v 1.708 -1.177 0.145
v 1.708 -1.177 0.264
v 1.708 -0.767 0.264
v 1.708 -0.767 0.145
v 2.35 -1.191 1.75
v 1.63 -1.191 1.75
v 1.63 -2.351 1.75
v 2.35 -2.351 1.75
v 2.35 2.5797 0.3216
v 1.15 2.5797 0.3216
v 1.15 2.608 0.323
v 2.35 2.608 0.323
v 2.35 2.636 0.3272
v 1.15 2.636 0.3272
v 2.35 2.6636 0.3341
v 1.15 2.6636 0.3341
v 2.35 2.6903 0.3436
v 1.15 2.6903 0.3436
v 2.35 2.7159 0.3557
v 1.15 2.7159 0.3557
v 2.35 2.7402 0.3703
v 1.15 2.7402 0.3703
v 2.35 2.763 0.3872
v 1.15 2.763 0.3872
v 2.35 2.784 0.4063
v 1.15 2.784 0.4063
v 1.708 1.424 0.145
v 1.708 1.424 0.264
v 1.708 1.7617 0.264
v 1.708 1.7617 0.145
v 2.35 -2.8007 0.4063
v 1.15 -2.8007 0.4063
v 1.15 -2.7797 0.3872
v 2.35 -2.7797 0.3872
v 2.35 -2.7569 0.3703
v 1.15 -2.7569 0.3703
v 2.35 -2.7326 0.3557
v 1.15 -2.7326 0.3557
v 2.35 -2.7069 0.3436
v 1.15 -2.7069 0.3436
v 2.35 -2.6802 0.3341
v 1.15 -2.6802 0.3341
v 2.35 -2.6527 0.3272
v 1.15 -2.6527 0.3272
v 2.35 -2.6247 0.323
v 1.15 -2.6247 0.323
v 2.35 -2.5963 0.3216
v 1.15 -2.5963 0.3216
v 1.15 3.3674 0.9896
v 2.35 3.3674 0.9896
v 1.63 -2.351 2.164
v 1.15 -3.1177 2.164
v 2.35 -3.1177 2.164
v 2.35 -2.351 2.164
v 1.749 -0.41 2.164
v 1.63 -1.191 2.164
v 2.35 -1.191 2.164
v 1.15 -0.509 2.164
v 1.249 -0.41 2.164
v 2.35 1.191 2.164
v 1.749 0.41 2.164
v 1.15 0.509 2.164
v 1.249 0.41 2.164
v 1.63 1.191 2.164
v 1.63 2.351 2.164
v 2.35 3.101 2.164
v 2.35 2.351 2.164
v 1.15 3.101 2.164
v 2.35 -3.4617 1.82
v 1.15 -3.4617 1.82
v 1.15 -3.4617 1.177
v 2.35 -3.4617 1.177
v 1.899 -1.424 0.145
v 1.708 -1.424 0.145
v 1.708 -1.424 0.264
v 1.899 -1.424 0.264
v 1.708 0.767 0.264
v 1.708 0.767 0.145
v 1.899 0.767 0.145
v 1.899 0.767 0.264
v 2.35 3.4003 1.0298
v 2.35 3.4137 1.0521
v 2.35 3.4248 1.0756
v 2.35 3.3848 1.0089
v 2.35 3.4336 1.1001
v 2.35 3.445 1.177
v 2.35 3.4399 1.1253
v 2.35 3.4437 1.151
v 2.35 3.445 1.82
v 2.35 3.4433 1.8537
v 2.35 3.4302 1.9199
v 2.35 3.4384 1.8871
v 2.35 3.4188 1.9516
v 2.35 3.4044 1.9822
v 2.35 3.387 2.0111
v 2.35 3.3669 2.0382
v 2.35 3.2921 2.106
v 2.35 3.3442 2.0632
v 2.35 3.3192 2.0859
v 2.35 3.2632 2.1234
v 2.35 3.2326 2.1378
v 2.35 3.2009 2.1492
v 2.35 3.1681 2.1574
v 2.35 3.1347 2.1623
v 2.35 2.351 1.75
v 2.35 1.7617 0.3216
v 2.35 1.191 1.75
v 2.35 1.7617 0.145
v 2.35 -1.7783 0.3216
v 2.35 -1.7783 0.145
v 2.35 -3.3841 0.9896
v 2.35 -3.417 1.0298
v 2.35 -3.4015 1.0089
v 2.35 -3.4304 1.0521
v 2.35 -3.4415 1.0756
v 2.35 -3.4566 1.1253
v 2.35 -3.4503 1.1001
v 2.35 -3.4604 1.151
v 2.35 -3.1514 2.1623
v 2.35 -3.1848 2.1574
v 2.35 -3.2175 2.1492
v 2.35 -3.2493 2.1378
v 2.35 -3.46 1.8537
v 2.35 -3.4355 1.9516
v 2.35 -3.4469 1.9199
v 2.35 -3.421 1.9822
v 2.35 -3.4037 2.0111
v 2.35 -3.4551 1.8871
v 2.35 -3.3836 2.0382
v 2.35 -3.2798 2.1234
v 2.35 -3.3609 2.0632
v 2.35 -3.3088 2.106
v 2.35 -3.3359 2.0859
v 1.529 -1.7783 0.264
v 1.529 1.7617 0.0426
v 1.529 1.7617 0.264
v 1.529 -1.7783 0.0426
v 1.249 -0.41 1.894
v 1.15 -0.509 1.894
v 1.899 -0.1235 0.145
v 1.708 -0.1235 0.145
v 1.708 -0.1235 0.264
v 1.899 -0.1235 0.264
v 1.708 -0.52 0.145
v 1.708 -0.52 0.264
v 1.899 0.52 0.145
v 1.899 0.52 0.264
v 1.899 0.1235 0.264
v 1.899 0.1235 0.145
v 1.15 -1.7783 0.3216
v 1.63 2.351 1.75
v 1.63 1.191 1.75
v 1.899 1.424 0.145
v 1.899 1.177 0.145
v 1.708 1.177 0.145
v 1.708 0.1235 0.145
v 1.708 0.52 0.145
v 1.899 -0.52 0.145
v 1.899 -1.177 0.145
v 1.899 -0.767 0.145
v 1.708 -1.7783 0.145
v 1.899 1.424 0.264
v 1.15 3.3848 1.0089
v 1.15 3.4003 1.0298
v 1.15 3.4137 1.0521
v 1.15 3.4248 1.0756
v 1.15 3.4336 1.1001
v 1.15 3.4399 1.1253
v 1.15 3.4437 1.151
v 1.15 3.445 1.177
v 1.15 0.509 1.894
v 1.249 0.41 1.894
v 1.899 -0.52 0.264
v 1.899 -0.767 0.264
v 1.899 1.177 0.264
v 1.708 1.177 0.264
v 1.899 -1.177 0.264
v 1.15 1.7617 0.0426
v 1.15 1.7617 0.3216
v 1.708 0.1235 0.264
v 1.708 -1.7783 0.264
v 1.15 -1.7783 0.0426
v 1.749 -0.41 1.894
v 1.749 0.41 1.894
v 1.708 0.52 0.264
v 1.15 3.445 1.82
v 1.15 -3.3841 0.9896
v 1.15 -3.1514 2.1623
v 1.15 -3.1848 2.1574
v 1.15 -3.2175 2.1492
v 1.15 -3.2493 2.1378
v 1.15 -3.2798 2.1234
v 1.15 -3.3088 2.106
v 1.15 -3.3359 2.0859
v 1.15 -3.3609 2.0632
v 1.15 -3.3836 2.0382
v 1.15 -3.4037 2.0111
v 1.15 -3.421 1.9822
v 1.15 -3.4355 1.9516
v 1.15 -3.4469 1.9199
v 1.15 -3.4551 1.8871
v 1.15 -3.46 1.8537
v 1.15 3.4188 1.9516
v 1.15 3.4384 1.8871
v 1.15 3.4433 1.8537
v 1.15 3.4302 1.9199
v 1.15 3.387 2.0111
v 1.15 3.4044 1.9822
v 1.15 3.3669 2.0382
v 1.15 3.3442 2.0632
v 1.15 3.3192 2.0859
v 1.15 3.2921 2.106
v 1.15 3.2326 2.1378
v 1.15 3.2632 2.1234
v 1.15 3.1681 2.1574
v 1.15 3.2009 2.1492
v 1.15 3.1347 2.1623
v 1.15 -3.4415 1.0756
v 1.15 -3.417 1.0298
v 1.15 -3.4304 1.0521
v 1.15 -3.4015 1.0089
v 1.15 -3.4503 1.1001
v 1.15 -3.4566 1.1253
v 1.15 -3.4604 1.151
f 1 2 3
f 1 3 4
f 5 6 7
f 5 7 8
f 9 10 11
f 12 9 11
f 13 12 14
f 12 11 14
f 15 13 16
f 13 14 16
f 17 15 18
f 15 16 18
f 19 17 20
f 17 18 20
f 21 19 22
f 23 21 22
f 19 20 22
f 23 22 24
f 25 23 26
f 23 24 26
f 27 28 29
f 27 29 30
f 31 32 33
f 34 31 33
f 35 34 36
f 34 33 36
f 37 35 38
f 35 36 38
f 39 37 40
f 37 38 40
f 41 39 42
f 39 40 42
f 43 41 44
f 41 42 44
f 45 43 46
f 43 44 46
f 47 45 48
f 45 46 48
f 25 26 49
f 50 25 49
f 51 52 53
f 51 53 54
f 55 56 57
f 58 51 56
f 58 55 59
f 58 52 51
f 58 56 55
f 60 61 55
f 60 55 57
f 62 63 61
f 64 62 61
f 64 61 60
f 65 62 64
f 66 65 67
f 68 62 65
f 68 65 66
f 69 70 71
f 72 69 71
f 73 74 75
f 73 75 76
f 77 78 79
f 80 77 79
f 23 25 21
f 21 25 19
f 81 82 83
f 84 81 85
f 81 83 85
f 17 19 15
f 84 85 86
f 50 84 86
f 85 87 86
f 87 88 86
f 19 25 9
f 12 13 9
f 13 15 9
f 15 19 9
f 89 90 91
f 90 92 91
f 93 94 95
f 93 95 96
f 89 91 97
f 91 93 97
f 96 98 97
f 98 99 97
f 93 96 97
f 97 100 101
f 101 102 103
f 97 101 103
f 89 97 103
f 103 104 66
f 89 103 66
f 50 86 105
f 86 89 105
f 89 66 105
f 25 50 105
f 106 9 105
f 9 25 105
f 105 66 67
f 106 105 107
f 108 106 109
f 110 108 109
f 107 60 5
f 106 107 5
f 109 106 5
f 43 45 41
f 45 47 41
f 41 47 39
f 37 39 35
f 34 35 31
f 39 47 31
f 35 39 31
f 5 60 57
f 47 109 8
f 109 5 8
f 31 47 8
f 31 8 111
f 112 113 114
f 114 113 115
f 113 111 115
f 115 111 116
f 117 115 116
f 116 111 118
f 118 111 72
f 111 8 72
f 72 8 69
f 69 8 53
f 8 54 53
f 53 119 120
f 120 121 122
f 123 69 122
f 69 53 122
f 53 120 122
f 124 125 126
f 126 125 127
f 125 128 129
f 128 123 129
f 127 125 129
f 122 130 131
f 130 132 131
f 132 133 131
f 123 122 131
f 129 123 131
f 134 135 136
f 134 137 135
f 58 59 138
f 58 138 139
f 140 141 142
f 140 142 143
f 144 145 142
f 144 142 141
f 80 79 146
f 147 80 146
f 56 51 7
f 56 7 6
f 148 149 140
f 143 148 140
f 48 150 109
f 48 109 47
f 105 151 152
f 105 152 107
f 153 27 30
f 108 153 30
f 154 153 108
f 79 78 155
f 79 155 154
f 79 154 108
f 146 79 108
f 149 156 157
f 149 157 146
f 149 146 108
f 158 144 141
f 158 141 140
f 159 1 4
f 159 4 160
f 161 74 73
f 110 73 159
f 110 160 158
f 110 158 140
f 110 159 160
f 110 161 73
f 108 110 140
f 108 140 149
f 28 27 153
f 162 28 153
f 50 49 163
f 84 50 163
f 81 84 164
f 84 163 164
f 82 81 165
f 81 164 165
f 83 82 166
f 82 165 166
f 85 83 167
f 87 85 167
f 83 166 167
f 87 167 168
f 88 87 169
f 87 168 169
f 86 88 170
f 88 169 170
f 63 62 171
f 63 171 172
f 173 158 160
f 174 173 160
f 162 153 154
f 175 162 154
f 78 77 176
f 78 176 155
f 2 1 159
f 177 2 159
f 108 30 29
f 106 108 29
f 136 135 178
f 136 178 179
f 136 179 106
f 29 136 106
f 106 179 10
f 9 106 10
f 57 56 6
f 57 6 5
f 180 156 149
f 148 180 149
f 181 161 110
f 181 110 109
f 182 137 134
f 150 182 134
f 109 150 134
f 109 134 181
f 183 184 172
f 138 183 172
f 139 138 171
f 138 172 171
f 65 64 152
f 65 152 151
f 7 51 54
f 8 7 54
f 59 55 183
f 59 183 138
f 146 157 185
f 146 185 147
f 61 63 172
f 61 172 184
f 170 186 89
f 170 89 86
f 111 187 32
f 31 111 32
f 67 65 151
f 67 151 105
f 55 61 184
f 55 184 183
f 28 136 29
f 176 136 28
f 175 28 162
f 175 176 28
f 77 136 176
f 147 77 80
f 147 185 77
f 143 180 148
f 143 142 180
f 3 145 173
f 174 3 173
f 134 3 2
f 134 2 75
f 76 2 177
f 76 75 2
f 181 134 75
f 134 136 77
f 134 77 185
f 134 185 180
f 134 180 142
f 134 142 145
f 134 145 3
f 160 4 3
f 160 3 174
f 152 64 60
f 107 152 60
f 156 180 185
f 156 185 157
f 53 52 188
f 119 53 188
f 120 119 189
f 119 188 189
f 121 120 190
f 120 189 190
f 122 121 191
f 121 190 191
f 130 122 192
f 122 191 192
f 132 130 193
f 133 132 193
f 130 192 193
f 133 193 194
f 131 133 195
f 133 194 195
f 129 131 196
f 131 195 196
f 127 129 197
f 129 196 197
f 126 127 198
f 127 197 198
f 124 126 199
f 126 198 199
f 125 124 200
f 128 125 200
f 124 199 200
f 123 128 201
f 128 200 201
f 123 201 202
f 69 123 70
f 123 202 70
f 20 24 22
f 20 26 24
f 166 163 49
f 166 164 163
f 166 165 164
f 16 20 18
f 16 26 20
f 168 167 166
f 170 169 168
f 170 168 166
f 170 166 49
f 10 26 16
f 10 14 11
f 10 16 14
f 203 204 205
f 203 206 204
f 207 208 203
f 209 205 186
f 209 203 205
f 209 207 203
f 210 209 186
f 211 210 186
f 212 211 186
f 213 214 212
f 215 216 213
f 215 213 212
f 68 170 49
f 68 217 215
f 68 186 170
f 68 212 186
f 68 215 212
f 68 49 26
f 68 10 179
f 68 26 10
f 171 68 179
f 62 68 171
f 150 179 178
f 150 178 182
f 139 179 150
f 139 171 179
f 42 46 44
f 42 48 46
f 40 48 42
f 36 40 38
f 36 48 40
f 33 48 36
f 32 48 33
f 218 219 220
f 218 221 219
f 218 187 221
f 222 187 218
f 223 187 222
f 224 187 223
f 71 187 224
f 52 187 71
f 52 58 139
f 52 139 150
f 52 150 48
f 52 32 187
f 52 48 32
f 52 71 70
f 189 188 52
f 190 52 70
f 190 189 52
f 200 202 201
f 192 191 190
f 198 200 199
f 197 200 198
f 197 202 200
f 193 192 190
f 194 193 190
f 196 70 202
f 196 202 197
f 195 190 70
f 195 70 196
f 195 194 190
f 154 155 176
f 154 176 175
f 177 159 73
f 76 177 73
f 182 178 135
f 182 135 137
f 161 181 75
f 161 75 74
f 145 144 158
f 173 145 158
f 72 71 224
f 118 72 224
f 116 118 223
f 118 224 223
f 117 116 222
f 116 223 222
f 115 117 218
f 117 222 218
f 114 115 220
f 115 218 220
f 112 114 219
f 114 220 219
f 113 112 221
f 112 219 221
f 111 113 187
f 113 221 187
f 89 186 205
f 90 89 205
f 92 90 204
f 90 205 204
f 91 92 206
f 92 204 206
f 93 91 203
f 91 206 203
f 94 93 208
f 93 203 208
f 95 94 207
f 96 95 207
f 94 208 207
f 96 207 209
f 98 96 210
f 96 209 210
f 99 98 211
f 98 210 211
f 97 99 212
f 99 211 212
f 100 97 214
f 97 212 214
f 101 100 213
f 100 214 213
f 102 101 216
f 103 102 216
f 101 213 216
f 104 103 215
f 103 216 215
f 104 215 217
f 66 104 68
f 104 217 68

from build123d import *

# Parameters (mm, degrees)
PAD009_DEPTH    = 1.8
PAD008_DEPTH    = 1.2
SKETCH018_W     = 0.214
SKETCH018_H     = 0.247
POCKET007_DEPTH = 0.119
SKETCH019_W     = 0.72
SKETCH019_H     = 1.16
POCKET008_DEPTH = 0.414
POCKET009_DEPTH = 0.27


with BuildPart() as pad009:
    # Sketch017 → Pad009 (new body, symmetric)
    with BuildSketch(Plane.XZ):
        Polygon((1.529, 0), (1.529, 0.264), (1.708, 0.264), (1.708, 0.145), (2.358, 0.145), (2.358, 0), align=None)
    extrude(amount=PAD009_DEPTH, both=True)


with BuildPart() as pocket009:
    # Sketch016 → Pad008 (new body)
    with BuildSketch(Plane(origin=(1.1499999635, -0.0083336435, -0.0078429583), x_dir=(0, 1, 0), z_dir=(1, 0, 0))):
        with BuildLine():
            Line((-3.1093336572, 2.1718425317), (3.1093336572, 2.1718425317))
            ThreePointArc((3.4533336572, 1.8278425317), (3.35257839, 2.0710872645), (3.1093336572, 2.1718425317))
            Line((3.4533336572, 1.8278425317), (3.4533336572, 1.1848425317))
            ThreePointArc((3.3757169542, 0.9974592347), (3.4331617333, 1.0834314222), (3.4533336572, 1.1848425317))
            Line((2.7923538598, 0.4140961402), (3.3757169542, 0.9974592347))
            ThreePointArc((2.588, 0.32945), (2.698595512, 0.3514488151), (2.7923538598, 0.4140961402))
            Line((1.77, 0.32945), (2.588, 0.32945))
            Line((1.77, 0.05045), (1.77, 0.32945))
            Line((1.77, 0.05045), (-1.77, 0.05045))
            Line((-1.77, 0.05045), (-1.77, 0.32945))
            Line((-1.77, 0.32945), (-2.588, 0.32945))
            ThreePointArc((-2.7923538598, 0.4140961402), (-2.698595512, 0.3514488151), (-2.588, 0.32945))
            Line((-3.3757169542, 0.9974592347), (-2.7923538598, 0.4140961402))
            ThreePointArc((-3.4533336572, 1.1848425317), (-3.4331617333, 1.0834314222), (-3.3757169542, 0.9974592347))
            Line((-3.4533336572, 1.8278425317), (-3.4533336572, 1.1848425317))
            ThreePointArc((-3.1093336572, 2.1718425317), (-3.35257839, 2.0710872645), (-3.4533336572, 1.8278425317))
        make_face()
    extrude(amount=PAD008_DEPTH)

    # Cut: cut Pad009
    add(pad009.part, mode=Mode.SUBTRACT)

    # Sketch018 (on Face19 of Cut) → Pocket007 (cut)
    with BuildSketch(Plane(origin=(0, 0, 0.145), x_dir=(1, 0, 0), z_dir=(0, 0, -1))):
        with Locations((1.792, -1.3005)):
            Rectangle(SKETCH018_W, SKETCH018_H)
        with Locations((1.792, -0.6435)):
            Rectangle(SKETCH018_W, SKETCH018_H)
        with Locations((1.792, 0)):
            Rectangle(SKETCH018_W, SKETCH018_H)
        with Locations((1.792, 0.6435)):
            Rectangle(SKETCH018_W, SKETCH018_H)
        with Locations((1.792, 1.3005)):
            Rectangle(SKETCH018_W, SKETCH018_H)
    extrude(amount=-POCKET007_DEPTH, mode=Mode.SUBTRACT)

    # Sketch019 (on Face2 of Pocket007) → Pocket008 (cut)
    with BuildSketch(Plane.XY.offset(2.1639995734)):
        with Locations((1.9899999635, -1.771)):
            Rectangle(SKETCH019_W, SKETCH019_H)
        with Locations((1.9899999635, 1.771)):
            Rectangle(SKETCH019_W, SKETCH019_H)
    extrude(amount=-POCKET008_DEPTH, mode=Mode.SUBTRACT)

    # Sketch020 (on Face2 of Pocket008) → Pocket009 (cut)
    with BuildSketch(Plane.XY.offset(2.1639995734)):
        Polygon((1.249, 0.41), (1.749, 0.41), (1.749, -0.41), (1.249, -0.41), (1.146, -0.513), (1.146, 0.513), align=None)
    extrude(amount=-POCKET009_DEPTH, mode=Mode.SUBTRACT)


solid = pocket009.part
